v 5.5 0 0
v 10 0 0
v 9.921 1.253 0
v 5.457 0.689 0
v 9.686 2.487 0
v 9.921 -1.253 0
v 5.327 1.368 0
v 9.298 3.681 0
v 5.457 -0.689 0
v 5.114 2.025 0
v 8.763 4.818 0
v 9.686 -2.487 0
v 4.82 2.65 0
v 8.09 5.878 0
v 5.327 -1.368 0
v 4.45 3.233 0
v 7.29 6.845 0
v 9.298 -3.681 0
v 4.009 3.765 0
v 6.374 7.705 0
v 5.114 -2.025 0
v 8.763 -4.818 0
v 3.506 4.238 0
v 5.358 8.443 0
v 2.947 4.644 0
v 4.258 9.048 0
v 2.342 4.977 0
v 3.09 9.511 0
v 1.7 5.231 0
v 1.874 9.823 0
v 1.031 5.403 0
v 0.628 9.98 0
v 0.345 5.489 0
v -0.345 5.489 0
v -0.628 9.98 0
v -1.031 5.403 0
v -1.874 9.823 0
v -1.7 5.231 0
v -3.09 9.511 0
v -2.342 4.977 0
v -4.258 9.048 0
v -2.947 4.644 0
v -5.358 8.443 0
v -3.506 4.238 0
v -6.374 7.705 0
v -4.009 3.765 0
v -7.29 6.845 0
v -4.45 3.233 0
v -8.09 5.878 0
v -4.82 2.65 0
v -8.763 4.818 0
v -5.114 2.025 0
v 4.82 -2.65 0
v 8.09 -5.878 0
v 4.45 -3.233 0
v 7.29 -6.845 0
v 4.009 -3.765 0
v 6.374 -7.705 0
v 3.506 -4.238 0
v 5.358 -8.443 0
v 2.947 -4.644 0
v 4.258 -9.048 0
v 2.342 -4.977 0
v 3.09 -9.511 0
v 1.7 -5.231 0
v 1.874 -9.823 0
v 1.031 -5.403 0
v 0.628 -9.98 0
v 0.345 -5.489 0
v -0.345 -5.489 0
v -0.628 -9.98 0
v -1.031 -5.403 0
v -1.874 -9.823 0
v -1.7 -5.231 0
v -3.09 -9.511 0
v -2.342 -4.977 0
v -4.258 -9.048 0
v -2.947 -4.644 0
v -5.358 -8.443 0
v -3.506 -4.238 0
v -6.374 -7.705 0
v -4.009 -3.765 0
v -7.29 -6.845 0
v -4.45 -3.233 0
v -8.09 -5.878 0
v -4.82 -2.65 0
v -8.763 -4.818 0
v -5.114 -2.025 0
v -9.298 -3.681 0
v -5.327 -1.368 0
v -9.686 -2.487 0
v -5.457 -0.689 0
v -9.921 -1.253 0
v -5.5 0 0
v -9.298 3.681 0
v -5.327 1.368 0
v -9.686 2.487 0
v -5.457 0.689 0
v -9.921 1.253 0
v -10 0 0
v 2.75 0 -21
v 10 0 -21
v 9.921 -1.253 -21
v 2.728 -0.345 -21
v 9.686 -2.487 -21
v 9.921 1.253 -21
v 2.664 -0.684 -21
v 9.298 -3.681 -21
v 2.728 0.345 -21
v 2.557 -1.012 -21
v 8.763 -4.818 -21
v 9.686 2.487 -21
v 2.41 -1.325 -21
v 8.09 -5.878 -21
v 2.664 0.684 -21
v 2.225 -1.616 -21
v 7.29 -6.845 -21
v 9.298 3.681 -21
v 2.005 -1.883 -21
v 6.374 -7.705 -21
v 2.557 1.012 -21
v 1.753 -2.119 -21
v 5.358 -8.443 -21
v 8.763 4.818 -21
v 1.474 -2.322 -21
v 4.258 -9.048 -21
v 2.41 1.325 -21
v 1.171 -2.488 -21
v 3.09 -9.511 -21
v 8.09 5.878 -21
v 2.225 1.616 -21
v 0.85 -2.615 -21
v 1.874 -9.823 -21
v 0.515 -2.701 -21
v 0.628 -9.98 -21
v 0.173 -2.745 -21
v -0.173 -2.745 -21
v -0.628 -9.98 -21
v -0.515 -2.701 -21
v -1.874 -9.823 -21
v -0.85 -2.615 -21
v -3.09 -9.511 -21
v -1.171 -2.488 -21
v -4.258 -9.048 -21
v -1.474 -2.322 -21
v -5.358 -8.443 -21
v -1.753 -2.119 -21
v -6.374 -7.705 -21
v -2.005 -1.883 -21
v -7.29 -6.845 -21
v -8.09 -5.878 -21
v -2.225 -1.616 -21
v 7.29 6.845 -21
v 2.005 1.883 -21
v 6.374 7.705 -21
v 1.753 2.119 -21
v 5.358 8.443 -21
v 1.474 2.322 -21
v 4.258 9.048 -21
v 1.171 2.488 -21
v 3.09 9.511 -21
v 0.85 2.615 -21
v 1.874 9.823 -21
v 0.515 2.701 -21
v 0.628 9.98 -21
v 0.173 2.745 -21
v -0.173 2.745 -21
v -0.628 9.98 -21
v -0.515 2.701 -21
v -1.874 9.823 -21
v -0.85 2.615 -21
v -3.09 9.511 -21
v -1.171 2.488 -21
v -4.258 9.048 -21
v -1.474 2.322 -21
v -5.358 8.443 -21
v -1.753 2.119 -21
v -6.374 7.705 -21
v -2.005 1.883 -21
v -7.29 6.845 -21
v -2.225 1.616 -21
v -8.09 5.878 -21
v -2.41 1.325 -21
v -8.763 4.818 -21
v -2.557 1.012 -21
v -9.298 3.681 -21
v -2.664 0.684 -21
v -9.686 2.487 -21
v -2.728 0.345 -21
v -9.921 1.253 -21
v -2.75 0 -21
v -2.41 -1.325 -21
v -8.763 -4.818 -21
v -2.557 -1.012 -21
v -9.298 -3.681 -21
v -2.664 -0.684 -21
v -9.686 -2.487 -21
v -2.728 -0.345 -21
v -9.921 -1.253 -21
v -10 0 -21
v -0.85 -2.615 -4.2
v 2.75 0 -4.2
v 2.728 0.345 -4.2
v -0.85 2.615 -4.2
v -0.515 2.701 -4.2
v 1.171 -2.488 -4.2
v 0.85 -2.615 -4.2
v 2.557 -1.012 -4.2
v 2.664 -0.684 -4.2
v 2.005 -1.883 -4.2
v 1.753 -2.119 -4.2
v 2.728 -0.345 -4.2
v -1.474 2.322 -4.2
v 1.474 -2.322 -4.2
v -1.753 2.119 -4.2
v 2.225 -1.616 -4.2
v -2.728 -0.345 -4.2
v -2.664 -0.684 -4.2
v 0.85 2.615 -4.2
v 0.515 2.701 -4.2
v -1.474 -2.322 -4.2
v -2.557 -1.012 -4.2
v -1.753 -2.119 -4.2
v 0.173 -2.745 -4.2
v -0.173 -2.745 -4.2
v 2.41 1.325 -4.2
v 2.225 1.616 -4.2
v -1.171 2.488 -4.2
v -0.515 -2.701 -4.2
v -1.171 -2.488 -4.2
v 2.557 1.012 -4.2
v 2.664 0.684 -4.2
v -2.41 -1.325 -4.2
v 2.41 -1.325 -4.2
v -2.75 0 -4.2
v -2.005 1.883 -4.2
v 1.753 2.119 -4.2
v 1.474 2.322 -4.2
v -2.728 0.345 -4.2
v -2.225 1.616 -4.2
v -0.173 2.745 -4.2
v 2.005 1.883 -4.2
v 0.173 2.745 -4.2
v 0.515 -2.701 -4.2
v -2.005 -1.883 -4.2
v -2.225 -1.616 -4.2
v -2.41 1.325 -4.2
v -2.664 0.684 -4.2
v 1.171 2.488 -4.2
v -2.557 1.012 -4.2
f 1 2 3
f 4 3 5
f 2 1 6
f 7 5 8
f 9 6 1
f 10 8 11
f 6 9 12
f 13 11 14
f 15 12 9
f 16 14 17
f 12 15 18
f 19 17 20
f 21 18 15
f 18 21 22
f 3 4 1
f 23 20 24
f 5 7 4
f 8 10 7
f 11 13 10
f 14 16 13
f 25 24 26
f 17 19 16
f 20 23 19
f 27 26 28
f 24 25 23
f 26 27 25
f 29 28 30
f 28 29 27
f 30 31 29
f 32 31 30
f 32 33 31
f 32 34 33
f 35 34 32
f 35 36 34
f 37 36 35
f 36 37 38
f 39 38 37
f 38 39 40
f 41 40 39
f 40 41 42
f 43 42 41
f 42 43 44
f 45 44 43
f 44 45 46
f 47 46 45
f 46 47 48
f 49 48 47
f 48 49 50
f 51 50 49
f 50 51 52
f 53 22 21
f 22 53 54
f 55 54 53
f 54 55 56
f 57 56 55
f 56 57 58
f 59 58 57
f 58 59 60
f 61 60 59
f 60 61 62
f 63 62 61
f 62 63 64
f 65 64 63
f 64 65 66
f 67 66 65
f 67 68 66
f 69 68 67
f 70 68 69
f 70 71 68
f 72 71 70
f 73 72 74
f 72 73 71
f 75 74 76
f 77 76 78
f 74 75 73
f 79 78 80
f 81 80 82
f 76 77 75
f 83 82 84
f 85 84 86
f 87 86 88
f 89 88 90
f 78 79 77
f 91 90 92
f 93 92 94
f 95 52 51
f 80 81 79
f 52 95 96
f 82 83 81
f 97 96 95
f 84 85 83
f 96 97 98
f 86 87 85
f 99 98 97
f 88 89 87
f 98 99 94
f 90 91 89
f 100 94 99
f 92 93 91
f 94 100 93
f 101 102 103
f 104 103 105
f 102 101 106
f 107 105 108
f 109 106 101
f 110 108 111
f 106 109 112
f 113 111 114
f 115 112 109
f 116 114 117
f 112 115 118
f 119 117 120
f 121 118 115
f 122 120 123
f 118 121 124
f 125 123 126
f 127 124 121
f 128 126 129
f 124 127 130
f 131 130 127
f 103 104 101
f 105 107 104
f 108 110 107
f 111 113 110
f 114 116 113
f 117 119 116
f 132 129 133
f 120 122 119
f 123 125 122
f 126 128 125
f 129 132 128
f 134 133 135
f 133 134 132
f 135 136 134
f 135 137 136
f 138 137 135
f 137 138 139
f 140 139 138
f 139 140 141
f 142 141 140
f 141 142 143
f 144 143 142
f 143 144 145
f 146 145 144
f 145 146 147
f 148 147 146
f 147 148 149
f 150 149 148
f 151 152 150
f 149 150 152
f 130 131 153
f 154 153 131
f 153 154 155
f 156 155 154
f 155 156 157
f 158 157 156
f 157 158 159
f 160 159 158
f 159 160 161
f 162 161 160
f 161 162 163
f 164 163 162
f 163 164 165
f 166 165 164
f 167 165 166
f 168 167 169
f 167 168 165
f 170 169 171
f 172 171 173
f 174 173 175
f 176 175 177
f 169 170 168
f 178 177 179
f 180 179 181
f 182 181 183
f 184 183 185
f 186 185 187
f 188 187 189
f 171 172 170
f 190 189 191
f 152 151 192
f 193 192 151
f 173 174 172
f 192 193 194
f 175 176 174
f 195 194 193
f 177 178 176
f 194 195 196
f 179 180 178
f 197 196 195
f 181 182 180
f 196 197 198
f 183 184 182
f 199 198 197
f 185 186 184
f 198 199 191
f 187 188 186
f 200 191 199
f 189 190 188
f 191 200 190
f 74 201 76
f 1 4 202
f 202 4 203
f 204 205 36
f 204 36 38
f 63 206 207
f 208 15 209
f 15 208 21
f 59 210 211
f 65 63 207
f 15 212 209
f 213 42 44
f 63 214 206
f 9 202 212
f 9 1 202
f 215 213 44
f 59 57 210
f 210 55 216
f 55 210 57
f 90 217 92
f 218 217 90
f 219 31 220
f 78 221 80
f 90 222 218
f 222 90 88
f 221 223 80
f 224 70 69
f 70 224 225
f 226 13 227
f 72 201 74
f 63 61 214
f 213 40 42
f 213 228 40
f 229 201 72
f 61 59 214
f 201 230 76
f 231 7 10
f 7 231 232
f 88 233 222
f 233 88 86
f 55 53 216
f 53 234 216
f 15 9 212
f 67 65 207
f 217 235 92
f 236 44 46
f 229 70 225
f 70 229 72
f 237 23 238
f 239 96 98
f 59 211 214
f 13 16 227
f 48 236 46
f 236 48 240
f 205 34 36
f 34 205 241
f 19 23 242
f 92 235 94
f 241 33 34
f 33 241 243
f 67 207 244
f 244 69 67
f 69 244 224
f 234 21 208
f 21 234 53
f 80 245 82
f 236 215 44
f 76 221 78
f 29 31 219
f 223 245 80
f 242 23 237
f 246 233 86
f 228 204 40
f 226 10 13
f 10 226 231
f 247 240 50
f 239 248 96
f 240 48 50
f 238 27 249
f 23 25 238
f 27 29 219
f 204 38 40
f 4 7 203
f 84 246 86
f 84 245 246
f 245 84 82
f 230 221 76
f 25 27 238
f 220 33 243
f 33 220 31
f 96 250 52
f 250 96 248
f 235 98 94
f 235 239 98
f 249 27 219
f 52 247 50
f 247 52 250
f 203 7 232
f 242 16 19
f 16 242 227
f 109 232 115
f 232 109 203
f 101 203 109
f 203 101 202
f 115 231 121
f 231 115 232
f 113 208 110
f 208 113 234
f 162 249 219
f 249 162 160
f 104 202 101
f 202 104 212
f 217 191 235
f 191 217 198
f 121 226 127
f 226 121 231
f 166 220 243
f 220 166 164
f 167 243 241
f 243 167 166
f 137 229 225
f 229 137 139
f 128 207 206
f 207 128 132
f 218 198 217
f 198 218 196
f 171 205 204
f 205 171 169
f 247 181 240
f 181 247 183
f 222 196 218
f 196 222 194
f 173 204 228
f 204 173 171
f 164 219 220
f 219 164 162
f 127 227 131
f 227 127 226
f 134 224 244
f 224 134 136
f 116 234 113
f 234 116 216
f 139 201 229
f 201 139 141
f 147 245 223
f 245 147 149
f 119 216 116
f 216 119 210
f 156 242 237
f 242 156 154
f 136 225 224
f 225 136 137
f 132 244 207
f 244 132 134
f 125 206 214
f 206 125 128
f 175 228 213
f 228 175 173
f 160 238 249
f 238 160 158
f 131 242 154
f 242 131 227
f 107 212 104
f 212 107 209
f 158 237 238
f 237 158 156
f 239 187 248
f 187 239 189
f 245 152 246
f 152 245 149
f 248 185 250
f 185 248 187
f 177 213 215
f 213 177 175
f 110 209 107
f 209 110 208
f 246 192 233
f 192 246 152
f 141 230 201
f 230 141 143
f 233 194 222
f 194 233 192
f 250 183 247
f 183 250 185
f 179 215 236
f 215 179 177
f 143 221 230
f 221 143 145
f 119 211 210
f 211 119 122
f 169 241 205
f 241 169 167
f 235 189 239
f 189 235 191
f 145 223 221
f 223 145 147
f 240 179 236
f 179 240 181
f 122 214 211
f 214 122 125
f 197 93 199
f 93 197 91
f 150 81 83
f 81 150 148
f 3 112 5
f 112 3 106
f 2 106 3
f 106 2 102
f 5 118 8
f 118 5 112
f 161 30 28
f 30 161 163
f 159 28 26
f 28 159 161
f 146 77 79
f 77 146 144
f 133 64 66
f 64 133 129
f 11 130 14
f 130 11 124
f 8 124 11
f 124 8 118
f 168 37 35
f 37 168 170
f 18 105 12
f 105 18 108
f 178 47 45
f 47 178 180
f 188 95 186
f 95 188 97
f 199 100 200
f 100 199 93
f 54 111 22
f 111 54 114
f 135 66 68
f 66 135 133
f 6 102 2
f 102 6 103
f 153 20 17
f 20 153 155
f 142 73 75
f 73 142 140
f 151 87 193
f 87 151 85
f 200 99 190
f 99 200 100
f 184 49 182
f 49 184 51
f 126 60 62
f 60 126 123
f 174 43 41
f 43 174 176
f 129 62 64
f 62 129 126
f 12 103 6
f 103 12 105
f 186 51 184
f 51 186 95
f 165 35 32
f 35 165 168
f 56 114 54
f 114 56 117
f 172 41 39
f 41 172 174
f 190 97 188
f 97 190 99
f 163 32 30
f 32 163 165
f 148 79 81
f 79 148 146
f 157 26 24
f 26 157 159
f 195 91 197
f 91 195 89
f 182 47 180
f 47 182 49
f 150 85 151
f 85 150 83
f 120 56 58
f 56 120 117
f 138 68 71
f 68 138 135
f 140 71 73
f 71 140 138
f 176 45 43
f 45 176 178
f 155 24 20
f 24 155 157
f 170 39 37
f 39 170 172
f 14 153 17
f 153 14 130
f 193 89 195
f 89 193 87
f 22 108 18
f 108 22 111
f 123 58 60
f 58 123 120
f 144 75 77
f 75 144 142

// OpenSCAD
$fn = 50;


difference() {
	union() {
		translate(v = [0, 0, -21.0000000000]) {
			cylinder(h = 21, r = 10.0000000000);
		}
	}
	union() {
		translate(v = [0, 0, 0]) {
			rotate(a = [0, 0, 0]) {
				difference() {
					union() {
						#translate(v = [0, 0, -21.0000000000]) {
							cylinder(h = 21, r = 2.2500000000);
						}
						#translate(v = [0, 0, -4.2000000000]) {
							cylinder(h = 4.2000000000, r = 10.0000000000, r1 = 2.7500000000, r2 = 5.5000000000);
						}
						#translate(v = [0, 0, -21.0000000000]) {
							cylinder(h = 21, r = 2.7500000000);
						}
						#translate(v = [0, 0, -21.0000000000]) {
							cylinder(h = 21, r = 2.2500000000);
						}
					}
					union();
				}
			}
		}
	}
}
